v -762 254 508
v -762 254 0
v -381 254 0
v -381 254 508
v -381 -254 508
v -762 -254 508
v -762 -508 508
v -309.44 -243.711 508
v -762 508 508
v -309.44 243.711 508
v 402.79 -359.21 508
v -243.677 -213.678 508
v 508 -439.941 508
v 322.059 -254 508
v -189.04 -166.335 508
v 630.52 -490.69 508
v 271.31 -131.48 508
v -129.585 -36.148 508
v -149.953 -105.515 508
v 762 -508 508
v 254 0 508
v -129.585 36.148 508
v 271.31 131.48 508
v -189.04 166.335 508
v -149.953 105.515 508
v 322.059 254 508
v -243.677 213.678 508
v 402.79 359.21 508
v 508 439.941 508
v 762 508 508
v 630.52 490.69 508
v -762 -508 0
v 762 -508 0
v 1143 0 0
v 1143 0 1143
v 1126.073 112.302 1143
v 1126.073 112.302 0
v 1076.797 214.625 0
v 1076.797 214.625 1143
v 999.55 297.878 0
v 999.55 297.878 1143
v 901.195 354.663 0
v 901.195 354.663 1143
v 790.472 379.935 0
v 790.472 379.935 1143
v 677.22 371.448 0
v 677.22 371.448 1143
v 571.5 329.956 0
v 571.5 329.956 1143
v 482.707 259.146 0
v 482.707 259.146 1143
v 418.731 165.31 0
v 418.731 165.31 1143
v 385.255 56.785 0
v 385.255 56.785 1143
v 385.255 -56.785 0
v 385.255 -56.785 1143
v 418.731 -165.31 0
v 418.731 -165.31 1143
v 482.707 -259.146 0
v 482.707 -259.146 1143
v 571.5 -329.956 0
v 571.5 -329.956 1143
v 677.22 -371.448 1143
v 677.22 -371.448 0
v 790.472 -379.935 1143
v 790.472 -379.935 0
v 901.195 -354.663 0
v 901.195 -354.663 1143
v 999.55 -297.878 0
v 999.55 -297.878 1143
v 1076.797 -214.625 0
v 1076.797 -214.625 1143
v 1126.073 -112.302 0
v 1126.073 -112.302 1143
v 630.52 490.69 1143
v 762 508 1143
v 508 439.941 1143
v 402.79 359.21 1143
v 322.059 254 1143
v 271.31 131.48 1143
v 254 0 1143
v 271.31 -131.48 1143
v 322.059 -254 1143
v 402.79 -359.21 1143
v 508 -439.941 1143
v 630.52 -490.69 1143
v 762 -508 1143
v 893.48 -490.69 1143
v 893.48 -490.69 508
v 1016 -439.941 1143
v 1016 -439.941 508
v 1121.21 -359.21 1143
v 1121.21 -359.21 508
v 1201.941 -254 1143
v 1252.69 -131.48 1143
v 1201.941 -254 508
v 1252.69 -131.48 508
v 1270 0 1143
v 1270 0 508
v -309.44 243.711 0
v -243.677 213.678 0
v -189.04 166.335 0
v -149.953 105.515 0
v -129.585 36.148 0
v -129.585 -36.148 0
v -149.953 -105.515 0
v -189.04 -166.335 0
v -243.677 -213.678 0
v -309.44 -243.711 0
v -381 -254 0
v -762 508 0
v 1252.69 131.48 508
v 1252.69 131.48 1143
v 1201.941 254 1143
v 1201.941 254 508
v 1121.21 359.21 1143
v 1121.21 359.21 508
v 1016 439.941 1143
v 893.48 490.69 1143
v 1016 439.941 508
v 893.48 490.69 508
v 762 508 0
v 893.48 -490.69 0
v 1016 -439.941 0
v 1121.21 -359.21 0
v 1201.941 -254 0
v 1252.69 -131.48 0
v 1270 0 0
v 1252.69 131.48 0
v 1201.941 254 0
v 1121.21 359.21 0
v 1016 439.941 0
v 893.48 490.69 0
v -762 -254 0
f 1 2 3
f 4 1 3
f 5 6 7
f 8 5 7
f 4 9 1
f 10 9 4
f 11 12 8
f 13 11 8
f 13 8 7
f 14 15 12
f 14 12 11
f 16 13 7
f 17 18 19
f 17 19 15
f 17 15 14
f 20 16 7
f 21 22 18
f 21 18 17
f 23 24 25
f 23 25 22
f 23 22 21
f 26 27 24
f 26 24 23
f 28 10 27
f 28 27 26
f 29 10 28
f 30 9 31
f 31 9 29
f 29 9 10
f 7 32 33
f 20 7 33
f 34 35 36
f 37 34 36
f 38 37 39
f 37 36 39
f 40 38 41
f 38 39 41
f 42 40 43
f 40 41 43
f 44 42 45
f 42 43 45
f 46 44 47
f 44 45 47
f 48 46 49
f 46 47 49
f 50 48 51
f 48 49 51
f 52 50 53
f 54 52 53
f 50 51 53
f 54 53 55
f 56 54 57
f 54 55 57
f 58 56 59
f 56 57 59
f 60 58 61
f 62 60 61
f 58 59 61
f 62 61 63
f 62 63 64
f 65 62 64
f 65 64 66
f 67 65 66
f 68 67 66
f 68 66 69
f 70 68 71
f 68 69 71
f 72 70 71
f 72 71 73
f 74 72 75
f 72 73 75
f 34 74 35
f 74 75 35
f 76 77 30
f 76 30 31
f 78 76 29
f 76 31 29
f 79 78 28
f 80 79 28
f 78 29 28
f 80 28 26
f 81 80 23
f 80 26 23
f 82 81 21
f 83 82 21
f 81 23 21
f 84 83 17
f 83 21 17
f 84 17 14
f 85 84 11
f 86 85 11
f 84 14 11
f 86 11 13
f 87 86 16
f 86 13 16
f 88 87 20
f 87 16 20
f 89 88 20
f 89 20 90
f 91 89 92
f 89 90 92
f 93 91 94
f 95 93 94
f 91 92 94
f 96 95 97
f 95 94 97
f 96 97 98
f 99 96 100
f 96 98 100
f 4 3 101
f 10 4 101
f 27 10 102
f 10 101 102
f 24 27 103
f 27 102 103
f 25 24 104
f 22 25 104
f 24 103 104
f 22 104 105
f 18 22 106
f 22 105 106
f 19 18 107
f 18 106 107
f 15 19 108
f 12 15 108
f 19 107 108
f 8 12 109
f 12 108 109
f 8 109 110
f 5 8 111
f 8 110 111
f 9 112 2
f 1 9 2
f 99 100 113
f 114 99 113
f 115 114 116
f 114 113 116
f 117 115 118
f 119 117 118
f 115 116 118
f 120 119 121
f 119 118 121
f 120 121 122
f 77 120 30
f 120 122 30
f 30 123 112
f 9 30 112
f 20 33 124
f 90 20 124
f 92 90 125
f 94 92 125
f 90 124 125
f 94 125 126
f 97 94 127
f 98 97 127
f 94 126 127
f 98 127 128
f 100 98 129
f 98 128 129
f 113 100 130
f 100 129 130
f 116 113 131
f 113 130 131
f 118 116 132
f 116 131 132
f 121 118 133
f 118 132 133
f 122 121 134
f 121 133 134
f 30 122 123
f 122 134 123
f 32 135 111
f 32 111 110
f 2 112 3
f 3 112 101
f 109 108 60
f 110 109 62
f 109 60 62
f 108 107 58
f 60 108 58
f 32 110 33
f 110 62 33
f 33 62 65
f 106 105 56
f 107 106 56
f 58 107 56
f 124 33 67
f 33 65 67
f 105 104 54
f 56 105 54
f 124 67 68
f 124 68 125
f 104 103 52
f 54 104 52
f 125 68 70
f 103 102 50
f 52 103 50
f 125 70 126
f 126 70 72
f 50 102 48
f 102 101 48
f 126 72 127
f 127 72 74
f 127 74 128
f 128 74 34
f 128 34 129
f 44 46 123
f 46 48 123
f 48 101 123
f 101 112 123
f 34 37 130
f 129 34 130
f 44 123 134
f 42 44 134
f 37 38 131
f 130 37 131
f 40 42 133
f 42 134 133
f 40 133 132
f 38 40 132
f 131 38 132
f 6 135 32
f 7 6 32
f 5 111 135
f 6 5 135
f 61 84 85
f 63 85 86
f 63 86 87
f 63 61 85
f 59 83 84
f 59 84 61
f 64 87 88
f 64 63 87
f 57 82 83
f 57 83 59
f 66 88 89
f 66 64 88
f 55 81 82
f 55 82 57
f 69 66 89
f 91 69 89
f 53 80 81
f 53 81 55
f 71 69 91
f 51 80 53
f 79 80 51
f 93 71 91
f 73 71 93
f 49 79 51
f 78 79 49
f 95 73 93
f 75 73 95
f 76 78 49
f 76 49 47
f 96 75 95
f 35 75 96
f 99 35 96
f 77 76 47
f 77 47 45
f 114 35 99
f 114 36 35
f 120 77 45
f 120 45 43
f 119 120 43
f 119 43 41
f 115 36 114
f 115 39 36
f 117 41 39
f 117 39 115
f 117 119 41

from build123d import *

# Parameters (mm, degrees)
F1_DEPTH = 508
F3_DEPTH = 635
F4_R     = 381
F5_DEPTH = 1143


with BuildPart() as f1:
    # F0 (on Top) → F1 (new body)
    with BuildSketch(Plane.XY):
        with BuildLine():
            Line((-762, -508), (762, -508))
            ThreePointArc((762, -508), (1270, 0), (762, 508))
            Line((762, 508), (-762, 508))
            Line((-762, 508), (-762, 254))
            Line((-762, 254), (-381, 254))
            ThreePointArc((-381, 254), (-127, 0), (-381, -254))
            Line((-381, -254), (-762, -254))
            Line((-762, -254), (-762, -508))
        make_face()
    extrude(amount=F1_DEPTH)

    # F2 (on face) → F3 (join)
    with BuildSketch(Plane.XY.offset(508)):
        with BuildLine():
            ThreePointArc((762, -508), (1121.210245, -359.210245), (1270, 0))
            ThreePointArc((1270, 0), (1121.210245, 359.210245), (762, 508))
            ThreePointArc((762, 508), (254, 0), (762, -508))
        make_face()
    extrude(amount=F3_DEPTH)

    # F4 (on face) → F5 (cut)
    with BuildSketch(Plane.XY.offset(1143)):
        with Locations((762, 0)):
            Circle(F4_R)
    extrude(amount=-F5_DEPTH, mode=Mode.SUBTRACT)


solid = f1.part
